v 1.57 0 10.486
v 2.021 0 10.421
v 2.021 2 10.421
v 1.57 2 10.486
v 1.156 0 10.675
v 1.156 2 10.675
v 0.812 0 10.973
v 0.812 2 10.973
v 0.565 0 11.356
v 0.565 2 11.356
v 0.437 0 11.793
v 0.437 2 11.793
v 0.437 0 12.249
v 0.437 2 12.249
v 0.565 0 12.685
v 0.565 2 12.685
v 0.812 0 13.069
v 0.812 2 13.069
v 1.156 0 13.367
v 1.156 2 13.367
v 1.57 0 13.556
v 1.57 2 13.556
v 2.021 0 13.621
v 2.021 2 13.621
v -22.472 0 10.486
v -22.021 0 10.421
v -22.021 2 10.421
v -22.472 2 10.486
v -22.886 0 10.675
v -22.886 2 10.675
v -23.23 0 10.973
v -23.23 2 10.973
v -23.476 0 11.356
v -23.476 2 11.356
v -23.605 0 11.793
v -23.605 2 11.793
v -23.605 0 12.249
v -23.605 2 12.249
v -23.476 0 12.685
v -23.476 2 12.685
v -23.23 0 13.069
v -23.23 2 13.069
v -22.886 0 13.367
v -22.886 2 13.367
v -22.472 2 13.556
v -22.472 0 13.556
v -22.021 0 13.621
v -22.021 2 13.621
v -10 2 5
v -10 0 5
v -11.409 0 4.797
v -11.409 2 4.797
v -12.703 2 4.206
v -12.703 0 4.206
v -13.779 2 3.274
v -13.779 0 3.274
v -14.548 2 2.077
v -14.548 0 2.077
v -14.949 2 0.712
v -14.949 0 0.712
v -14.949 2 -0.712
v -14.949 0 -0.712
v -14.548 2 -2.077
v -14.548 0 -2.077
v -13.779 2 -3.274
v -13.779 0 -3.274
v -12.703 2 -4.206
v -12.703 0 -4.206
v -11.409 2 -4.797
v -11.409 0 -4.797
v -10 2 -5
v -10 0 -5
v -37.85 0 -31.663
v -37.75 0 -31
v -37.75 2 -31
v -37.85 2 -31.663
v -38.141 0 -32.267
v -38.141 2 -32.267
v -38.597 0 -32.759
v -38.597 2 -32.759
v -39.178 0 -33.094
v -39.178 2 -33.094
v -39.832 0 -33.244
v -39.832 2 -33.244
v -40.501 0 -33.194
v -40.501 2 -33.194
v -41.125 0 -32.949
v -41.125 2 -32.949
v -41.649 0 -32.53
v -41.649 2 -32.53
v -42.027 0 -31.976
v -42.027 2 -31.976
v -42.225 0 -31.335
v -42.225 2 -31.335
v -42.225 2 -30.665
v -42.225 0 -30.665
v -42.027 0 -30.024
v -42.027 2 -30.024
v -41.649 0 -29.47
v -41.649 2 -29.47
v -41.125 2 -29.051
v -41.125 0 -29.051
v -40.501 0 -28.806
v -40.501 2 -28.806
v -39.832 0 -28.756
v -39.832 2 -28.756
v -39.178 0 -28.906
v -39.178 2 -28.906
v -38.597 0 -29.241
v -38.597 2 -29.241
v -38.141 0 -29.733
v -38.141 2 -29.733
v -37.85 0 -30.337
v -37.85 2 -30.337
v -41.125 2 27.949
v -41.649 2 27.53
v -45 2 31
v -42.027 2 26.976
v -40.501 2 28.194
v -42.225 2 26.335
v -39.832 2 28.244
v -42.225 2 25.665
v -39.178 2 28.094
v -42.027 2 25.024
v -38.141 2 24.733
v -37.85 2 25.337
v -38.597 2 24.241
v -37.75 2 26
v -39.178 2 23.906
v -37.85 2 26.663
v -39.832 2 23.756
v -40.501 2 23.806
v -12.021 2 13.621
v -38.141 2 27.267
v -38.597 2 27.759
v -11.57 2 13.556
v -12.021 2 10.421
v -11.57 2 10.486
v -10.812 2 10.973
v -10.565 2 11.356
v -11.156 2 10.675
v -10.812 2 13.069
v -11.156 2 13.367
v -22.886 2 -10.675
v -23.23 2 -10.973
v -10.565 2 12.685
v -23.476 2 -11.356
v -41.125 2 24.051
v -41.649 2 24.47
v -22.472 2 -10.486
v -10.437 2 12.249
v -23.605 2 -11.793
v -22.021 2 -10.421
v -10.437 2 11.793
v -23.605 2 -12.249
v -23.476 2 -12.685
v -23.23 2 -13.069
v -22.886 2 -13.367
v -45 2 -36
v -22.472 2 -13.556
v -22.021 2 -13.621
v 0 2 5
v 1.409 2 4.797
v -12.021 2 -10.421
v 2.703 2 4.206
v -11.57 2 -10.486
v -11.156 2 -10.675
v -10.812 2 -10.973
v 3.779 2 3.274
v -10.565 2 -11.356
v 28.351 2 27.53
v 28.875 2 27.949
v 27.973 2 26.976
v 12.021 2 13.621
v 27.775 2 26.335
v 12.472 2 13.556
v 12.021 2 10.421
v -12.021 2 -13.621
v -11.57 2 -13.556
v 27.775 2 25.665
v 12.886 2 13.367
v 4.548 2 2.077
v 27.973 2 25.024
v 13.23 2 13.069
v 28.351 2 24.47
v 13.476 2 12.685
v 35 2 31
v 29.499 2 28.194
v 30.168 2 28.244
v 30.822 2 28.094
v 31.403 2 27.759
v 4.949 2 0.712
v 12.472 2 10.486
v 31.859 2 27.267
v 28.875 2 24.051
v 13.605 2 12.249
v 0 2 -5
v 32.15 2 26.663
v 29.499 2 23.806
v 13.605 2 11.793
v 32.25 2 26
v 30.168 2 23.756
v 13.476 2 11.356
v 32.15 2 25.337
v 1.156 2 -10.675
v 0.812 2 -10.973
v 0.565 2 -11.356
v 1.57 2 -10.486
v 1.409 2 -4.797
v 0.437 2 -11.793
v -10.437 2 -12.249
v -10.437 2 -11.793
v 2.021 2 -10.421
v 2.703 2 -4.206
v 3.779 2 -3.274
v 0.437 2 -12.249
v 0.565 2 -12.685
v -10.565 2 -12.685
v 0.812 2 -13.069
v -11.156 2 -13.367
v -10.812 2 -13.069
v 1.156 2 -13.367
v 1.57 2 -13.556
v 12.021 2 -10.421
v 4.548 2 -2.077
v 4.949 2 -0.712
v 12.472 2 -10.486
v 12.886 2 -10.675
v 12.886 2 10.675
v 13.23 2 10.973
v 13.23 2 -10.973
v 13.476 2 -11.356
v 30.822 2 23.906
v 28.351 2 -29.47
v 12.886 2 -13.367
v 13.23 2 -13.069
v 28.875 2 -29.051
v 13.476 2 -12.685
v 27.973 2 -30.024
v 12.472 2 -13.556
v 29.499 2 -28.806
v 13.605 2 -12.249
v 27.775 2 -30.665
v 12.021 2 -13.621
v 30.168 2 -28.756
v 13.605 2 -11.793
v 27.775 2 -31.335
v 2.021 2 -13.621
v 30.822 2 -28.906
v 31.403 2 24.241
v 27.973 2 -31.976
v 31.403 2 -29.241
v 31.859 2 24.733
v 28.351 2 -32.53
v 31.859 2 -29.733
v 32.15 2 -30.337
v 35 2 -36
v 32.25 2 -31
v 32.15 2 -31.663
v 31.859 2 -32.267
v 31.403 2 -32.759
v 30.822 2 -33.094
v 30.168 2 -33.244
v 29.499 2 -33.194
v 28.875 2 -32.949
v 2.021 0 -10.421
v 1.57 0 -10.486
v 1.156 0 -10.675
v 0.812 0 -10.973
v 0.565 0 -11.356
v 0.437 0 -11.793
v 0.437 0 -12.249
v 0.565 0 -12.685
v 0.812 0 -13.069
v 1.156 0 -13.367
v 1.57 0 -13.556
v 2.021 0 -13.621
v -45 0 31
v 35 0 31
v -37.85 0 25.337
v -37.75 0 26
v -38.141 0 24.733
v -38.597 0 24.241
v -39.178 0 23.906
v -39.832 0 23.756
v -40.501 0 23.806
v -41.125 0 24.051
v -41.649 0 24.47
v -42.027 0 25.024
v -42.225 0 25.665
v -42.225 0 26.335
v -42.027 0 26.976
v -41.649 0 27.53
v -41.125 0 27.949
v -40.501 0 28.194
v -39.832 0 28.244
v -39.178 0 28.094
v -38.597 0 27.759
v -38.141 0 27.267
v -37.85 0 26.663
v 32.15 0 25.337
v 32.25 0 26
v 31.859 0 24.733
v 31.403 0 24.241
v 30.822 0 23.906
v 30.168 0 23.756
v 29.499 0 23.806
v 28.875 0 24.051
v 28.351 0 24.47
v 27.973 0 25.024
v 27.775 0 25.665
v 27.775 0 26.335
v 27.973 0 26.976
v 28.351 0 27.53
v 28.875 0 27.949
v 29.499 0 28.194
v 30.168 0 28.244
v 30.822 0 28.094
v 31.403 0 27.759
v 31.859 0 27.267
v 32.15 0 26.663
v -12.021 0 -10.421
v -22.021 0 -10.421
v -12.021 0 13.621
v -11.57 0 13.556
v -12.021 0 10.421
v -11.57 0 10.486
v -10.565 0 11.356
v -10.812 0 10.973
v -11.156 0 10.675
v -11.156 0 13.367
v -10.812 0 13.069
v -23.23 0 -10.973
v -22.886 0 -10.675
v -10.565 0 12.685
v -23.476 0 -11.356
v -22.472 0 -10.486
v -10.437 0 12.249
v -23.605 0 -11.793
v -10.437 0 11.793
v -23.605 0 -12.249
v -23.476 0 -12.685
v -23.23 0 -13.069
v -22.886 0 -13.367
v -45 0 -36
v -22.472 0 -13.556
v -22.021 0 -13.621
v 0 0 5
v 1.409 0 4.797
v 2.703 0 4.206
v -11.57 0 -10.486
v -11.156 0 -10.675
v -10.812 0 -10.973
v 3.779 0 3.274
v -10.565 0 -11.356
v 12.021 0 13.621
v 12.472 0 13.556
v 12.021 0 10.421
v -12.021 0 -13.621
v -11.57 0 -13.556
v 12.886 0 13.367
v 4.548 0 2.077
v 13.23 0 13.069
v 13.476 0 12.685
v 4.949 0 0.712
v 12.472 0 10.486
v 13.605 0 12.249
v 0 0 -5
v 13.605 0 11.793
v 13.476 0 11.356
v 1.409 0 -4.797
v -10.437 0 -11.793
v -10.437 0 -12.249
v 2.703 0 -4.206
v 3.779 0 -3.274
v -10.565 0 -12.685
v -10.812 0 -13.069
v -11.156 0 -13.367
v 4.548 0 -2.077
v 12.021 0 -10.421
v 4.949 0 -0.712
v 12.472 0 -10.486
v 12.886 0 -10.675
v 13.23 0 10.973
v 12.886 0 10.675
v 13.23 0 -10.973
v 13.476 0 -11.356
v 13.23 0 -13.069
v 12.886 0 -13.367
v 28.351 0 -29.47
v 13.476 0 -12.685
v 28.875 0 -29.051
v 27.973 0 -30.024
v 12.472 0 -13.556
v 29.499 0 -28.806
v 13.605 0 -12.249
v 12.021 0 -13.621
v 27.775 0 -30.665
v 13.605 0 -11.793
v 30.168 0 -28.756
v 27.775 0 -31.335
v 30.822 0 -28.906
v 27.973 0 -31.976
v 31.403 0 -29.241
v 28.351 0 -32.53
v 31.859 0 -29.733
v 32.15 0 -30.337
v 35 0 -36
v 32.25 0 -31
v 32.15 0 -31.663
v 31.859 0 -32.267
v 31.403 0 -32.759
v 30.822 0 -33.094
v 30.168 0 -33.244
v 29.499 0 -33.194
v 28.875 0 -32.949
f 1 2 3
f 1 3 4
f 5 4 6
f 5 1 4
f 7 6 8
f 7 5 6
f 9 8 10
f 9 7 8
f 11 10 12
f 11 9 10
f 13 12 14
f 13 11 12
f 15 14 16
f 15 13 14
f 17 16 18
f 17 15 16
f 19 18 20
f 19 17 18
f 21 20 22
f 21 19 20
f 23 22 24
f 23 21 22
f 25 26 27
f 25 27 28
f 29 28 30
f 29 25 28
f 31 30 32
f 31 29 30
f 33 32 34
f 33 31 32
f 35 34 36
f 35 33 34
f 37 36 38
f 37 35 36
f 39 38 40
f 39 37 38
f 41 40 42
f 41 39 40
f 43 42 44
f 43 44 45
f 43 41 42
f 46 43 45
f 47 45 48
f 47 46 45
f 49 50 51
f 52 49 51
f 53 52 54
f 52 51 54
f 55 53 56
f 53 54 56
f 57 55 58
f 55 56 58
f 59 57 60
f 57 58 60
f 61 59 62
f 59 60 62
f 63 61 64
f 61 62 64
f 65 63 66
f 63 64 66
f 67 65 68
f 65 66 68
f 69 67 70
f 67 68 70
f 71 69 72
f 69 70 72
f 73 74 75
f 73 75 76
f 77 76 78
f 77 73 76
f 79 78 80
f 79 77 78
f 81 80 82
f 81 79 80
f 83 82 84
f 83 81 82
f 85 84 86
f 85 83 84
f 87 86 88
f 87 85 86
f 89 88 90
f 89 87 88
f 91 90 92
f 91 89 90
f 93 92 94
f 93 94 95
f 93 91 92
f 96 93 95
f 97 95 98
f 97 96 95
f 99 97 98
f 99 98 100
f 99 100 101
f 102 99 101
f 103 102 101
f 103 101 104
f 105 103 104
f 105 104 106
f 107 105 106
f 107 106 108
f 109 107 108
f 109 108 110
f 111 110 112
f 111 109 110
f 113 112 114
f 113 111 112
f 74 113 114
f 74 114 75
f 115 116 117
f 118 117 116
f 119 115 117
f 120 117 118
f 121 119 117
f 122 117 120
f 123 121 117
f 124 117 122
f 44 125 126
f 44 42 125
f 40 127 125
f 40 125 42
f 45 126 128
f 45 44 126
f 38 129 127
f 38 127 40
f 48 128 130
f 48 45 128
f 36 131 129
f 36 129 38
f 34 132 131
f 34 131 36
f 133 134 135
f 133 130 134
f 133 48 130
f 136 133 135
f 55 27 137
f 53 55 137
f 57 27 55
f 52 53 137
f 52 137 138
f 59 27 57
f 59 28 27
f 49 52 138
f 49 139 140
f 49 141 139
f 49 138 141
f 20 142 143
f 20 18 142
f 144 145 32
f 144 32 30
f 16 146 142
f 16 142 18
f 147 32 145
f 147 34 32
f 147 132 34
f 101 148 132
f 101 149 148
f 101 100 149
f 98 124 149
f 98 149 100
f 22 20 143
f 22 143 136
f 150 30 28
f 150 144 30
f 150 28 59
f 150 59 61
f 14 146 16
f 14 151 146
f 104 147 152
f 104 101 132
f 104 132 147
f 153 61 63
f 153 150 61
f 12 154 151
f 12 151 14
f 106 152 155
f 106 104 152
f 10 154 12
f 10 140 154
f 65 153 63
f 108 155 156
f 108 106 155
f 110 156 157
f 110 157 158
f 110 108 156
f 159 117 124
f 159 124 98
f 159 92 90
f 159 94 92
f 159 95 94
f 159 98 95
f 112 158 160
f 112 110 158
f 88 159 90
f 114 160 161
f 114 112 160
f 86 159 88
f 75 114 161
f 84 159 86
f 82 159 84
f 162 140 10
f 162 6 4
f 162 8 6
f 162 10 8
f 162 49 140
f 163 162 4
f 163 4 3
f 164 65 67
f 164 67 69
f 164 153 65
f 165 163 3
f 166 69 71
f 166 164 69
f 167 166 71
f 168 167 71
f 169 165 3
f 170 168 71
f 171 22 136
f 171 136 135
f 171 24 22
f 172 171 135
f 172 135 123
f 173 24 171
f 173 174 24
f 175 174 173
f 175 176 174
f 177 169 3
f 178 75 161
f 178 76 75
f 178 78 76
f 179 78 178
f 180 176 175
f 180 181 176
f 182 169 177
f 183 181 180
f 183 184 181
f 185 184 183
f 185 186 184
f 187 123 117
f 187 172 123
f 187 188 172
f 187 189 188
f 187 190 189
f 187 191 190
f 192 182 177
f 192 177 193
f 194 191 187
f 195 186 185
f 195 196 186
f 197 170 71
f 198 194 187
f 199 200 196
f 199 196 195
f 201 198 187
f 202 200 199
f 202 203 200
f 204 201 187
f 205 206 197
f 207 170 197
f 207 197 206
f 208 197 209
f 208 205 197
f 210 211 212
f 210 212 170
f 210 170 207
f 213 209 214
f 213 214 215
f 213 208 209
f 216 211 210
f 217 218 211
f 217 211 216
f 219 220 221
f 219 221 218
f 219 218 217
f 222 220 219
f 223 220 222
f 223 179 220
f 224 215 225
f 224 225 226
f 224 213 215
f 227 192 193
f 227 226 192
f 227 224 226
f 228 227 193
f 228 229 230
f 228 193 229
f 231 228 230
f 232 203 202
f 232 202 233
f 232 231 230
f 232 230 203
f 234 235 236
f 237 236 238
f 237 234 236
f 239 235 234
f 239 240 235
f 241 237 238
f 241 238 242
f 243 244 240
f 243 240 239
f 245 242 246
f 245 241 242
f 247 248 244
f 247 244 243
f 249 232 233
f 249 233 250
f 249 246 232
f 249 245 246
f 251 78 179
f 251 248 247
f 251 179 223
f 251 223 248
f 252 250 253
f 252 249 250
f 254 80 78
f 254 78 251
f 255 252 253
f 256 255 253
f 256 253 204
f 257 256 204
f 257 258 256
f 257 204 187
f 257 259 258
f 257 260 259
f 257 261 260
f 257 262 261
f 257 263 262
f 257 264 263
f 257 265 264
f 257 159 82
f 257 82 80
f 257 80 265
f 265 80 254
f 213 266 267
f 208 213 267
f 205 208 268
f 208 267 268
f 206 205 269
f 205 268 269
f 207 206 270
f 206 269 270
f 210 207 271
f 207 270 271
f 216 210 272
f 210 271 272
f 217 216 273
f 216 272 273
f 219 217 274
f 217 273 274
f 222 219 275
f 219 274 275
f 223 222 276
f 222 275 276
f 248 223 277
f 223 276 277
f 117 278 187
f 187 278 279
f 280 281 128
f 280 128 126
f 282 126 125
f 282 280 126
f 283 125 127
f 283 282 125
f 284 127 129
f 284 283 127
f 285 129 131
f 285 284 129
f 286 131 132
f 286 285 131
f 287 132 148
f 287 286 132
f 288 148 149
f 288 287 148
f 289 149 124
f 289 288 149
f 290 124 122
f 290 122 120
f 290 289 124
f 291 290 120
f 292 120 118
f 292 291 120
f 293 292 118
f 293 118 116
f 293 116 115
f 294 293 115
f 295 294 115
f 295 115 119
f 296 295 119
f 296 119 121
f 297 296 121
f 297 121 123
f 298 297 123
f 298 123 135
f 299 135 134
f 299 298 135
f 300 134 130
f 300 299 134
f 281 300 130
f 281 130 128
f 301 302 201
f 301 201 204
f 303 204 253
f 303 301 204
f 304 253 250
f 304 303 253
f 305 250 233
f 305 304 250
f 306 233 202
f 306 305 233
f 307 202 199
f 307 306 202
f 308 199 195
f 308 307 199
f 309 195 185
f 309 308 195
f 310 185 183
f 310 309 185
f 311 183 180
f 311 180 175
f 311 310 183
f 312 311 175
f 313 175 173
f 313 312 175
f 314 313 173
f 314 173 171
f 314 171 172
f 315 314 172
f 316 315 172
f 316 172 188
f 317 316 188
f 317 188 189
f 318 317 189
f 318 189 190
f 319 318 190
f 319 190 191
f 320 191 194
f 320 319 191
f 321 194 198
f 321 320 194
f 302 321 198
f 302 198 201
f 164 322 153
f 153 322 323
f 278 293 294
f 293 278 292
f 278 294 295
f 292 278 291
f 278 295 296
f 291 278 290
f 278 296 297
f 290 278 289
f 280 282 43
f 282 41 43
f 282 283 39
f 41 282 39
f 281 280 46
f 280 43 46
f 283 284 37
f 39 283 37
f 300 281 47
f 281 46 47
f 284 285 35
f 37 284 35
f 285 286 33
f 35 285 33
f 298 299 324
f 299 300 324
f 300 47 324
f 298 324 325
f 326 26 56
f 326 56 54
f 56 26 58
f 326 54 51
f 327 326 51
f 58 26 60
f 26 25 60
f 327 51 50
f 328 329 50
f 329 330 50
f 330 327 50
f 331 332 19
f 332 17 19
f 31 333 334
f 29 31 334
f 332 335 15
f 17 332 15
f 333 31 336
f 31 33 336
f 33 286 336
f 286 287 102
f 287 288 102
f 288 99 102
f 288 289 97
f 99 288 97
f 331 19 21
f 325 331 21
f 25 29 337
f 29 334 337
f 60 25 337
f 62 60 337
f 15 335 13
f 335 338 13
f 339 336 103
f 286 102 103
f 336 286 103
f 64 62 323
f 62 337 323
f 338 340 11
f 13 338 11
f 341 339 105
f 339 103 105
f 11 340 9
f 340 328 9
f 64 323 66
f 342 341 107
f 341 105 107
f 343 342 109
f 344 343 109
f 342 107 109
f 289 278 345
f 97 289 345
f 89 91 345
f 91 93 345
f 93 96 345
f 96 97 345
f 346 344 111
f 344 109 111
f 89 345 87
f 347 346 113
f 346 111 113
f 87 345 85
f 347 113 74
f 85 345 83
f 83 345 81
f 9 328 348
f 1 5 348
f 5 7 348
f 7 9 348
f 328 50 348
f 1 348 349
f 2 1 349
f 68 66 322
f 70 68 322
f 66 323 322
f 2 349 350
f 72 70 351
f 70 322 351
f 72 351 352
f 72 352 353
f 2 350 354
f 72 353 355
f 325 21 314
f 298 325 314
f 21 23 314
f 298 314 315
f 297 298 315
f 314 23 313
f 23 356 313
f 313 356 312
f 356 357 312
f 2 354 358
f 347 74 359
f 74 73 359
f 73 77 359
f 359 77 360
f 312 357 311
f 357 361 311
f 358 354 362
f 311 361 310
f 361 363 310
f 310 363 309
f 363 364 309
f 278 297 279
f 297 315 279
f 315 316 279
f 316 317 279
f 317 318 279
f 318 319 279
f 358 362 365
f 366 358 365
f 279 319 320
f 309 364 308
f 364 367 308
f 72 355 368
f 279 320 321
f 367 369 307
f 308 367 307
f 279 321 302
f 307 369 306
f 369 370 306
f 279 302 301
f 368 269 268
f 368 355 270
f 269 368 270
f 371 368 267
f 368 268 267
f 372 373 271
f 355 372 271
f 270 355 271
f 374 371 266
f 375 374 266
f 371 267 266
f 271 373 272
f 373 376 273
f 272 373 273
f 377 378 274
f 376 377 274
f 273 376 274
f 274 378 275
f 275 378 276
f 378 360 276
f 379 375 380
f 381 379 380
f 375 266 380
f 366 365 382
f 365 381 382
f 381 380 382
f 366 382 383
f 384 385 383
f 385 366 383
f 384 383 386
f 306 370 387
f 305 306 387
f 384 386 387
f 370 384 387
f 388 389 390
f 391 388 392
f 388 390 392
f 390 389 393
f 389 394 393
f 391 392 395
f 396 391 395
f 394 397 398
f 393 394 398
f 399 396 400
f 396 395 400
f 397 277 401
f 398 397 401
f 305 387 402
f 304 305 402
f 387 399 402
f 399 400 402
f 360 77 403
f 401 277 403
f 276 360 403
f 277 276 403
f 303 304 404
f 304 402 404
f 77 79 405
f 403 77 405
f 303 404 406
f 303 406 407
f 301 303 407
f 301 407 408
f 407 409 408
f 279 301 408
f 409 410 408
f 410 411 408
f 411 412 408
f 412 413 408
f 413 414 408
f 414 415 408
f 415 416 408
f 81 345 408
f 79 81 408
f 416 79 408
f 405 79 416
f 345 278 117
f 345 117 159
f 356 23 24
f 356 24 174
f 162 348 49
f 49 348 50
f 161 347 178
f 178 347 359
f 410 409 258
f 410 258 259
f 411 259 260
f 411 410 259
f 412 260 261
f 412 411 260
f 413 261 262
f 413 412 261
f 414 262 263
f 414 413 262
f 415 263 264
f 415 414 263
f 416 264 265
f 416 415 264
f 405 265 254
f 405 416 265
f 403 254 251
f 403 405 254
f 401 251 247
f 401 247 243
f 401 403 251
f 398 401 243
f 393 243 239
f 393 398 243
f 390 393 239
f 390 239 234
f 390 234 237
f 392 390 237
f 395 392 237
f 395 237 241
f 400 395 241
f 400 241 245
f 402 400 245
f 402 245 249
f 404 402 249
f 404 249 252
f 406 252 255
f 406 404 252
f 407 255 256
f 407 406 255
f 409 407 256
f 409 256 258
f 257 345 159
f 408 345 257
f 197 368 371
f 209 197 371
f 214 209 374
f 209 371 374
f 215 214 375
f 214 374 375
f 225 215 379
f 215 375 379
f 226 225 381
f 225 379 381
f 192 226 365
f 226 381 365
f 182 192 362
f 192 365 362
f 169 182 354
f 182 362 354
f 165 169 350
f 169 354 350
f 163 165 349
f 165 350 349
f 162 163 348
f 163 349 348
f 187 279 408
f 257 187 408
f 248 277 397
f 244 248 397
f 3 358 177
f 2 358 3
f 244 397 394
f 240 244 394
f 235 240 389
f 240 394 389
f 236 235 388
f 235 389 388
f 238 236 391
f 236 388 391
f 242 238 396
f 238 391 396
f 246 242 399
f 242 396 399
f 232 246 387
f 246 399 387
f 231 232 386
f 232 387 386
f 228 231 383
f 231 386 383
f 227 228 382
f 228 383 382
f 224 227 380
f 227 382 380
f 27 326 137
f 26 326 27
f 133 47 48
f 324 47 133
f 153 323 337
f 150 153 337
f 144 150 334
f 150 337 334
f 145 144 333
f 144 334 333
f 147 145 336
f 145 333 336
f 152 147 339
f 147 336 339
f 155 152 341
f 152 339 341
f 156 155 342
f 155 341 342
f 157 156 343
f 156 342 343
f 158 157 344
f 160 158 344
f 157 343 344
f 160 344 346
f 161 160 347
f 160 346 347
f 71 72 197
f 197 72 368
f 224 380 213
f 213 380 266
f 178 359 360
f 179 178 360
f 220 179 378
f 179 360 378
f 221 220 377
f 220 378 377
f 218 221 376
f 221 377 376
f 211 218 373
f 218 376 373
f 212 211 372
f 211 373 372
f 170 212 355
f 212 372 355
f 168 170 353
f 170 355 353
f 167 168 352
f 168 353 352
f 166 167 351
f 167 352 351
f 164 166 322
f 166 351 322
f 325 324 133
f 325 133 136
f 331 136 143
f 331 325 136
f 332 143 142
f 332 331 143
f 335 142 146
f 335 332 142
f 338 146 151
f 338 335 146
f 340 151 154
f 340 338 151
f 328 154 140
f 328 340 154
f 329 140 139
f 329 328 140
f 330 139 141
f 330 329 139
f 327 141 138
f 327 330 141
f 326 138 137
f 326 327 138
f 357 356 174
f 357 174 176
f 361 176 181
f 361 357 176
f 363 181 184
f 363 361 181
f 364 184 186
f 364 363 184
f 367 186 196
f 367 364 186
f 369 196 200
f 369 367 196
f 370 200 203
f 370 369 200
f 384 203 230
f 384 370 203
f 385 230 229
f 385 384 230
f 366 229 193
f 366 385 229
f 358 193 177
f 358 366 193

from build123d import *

# Parameters (mm, degrees)
SKETCH1_W           = 80
SKETCH1_H           = 67
SKETCH1_R           = 2.25
BOSS_EXTRUDE1_DEPTH = 2


with BuildPart() as part:
    # Sketch1 → Boss-Extrude1 (new body)
    with BuildSketch(Plane(origin=(0, 0, 0), x_dir=(1, 0, 0), z_dir=(0, 1, 0))):
        with Locations((-5, 2.5)):
            Rectangle(SKETCH1_W, SKETCH1_H)
        with Locations((30, -26)):
            Circle(SKETCH1_R, mode=Mode.SUBTRACT)
        with Locations((-40, -26)):
            Circle(SKETCH1_R, mode=Mode.SUBTRACT)
        with Locations((-40, 31)):
            Circle(SKETCH1_R, mode=Mode.SUBTRACT)
        with Locations((30, 31)):
            Circle(SKETCH1_R, mode=Mode.SUBTRACT)
        with BuildLine():
            Line((-22.02081528, 13.62081528), (-12.02081528, 13.62081528))
            ThreePointArc((-12.02081528, 13.62081528), (-10.42081528, 12.02081528), (-12.02081528, 10.42081528))
            Line((-12.02081528, 10.42081528), (-22.02081528, 10.42081528))
            ThreePointArc((-22.02081528, 10.42081528), (-23.62081528, 12.02081528), (-22.02081528, 13.62081528))
        make_face(mode=Mode.SUBTRACT)
        with BuildLine():
            Line((2.02081528, 13.62081528), (12.02081528, 13.62081528))
            ThreePointArc((12.02081528, 13.62081528), (13.62081528, 12.02081528), (12.02081528, 10.42081528))
            Line((12.02081528, 10.42081528), (2.02081528, 10.42081528))
            ThreePointArc((2.02081528, 10.42081528), (0.42081528, 12.02081528), (2.02081528, 13.62081528))
        make_face(mode=Mode.SUBTRACT)
        with BuildLine():
            Line((-10, 5), (0, 5))
            ThreePointArc((0, 5), (5, 0), (0, -5))
            Line((0, -5), (-10, -5))
            ThreePointArc((-10, -5), (-15, 0), (-10, 5))
        make_face(mode=Mode.SUBTRACT)
        with BuildLine():
            Line((-22.02081528, -13.62081528), (-12.02081528, -13.62081528))
            ThreePointArc((-12.02081528, -13.62081528), (-10.42081528, -12.02081528), (-12.02081528, -10.42081528))
            Line((-12.02081528, -10.42081528), (-22.02081528, -10.42081528))
            ThreePointArc((-22.02081528, -10.42081528), (-23.62081528, -12.02081528), (-22.02081528, -13.62081528))
        make_face(mode=Mode.SUBTRACT)
        with BuildLine():
            Line((2.02081528, -13.62081528), (12.02081528, -13.62081528))
            ThreePointArc((12.02081528, -13.62081528), (13.62081528, -12.02081528), (12.02081528, -10.42081528))
            Line((12.02081528, -10.42081528), (2.02081528, -10.42081528))
            ThreePointArc((2.02081528, -10.42081528), (0.42081528, -12.02081528), (2.02081528, -13.62081528))
        make_face(mode=Mode.SUBTRACT)
    extrude(amount=BOSS_EXTRUDE1_DEPTH)


solid = part.part
